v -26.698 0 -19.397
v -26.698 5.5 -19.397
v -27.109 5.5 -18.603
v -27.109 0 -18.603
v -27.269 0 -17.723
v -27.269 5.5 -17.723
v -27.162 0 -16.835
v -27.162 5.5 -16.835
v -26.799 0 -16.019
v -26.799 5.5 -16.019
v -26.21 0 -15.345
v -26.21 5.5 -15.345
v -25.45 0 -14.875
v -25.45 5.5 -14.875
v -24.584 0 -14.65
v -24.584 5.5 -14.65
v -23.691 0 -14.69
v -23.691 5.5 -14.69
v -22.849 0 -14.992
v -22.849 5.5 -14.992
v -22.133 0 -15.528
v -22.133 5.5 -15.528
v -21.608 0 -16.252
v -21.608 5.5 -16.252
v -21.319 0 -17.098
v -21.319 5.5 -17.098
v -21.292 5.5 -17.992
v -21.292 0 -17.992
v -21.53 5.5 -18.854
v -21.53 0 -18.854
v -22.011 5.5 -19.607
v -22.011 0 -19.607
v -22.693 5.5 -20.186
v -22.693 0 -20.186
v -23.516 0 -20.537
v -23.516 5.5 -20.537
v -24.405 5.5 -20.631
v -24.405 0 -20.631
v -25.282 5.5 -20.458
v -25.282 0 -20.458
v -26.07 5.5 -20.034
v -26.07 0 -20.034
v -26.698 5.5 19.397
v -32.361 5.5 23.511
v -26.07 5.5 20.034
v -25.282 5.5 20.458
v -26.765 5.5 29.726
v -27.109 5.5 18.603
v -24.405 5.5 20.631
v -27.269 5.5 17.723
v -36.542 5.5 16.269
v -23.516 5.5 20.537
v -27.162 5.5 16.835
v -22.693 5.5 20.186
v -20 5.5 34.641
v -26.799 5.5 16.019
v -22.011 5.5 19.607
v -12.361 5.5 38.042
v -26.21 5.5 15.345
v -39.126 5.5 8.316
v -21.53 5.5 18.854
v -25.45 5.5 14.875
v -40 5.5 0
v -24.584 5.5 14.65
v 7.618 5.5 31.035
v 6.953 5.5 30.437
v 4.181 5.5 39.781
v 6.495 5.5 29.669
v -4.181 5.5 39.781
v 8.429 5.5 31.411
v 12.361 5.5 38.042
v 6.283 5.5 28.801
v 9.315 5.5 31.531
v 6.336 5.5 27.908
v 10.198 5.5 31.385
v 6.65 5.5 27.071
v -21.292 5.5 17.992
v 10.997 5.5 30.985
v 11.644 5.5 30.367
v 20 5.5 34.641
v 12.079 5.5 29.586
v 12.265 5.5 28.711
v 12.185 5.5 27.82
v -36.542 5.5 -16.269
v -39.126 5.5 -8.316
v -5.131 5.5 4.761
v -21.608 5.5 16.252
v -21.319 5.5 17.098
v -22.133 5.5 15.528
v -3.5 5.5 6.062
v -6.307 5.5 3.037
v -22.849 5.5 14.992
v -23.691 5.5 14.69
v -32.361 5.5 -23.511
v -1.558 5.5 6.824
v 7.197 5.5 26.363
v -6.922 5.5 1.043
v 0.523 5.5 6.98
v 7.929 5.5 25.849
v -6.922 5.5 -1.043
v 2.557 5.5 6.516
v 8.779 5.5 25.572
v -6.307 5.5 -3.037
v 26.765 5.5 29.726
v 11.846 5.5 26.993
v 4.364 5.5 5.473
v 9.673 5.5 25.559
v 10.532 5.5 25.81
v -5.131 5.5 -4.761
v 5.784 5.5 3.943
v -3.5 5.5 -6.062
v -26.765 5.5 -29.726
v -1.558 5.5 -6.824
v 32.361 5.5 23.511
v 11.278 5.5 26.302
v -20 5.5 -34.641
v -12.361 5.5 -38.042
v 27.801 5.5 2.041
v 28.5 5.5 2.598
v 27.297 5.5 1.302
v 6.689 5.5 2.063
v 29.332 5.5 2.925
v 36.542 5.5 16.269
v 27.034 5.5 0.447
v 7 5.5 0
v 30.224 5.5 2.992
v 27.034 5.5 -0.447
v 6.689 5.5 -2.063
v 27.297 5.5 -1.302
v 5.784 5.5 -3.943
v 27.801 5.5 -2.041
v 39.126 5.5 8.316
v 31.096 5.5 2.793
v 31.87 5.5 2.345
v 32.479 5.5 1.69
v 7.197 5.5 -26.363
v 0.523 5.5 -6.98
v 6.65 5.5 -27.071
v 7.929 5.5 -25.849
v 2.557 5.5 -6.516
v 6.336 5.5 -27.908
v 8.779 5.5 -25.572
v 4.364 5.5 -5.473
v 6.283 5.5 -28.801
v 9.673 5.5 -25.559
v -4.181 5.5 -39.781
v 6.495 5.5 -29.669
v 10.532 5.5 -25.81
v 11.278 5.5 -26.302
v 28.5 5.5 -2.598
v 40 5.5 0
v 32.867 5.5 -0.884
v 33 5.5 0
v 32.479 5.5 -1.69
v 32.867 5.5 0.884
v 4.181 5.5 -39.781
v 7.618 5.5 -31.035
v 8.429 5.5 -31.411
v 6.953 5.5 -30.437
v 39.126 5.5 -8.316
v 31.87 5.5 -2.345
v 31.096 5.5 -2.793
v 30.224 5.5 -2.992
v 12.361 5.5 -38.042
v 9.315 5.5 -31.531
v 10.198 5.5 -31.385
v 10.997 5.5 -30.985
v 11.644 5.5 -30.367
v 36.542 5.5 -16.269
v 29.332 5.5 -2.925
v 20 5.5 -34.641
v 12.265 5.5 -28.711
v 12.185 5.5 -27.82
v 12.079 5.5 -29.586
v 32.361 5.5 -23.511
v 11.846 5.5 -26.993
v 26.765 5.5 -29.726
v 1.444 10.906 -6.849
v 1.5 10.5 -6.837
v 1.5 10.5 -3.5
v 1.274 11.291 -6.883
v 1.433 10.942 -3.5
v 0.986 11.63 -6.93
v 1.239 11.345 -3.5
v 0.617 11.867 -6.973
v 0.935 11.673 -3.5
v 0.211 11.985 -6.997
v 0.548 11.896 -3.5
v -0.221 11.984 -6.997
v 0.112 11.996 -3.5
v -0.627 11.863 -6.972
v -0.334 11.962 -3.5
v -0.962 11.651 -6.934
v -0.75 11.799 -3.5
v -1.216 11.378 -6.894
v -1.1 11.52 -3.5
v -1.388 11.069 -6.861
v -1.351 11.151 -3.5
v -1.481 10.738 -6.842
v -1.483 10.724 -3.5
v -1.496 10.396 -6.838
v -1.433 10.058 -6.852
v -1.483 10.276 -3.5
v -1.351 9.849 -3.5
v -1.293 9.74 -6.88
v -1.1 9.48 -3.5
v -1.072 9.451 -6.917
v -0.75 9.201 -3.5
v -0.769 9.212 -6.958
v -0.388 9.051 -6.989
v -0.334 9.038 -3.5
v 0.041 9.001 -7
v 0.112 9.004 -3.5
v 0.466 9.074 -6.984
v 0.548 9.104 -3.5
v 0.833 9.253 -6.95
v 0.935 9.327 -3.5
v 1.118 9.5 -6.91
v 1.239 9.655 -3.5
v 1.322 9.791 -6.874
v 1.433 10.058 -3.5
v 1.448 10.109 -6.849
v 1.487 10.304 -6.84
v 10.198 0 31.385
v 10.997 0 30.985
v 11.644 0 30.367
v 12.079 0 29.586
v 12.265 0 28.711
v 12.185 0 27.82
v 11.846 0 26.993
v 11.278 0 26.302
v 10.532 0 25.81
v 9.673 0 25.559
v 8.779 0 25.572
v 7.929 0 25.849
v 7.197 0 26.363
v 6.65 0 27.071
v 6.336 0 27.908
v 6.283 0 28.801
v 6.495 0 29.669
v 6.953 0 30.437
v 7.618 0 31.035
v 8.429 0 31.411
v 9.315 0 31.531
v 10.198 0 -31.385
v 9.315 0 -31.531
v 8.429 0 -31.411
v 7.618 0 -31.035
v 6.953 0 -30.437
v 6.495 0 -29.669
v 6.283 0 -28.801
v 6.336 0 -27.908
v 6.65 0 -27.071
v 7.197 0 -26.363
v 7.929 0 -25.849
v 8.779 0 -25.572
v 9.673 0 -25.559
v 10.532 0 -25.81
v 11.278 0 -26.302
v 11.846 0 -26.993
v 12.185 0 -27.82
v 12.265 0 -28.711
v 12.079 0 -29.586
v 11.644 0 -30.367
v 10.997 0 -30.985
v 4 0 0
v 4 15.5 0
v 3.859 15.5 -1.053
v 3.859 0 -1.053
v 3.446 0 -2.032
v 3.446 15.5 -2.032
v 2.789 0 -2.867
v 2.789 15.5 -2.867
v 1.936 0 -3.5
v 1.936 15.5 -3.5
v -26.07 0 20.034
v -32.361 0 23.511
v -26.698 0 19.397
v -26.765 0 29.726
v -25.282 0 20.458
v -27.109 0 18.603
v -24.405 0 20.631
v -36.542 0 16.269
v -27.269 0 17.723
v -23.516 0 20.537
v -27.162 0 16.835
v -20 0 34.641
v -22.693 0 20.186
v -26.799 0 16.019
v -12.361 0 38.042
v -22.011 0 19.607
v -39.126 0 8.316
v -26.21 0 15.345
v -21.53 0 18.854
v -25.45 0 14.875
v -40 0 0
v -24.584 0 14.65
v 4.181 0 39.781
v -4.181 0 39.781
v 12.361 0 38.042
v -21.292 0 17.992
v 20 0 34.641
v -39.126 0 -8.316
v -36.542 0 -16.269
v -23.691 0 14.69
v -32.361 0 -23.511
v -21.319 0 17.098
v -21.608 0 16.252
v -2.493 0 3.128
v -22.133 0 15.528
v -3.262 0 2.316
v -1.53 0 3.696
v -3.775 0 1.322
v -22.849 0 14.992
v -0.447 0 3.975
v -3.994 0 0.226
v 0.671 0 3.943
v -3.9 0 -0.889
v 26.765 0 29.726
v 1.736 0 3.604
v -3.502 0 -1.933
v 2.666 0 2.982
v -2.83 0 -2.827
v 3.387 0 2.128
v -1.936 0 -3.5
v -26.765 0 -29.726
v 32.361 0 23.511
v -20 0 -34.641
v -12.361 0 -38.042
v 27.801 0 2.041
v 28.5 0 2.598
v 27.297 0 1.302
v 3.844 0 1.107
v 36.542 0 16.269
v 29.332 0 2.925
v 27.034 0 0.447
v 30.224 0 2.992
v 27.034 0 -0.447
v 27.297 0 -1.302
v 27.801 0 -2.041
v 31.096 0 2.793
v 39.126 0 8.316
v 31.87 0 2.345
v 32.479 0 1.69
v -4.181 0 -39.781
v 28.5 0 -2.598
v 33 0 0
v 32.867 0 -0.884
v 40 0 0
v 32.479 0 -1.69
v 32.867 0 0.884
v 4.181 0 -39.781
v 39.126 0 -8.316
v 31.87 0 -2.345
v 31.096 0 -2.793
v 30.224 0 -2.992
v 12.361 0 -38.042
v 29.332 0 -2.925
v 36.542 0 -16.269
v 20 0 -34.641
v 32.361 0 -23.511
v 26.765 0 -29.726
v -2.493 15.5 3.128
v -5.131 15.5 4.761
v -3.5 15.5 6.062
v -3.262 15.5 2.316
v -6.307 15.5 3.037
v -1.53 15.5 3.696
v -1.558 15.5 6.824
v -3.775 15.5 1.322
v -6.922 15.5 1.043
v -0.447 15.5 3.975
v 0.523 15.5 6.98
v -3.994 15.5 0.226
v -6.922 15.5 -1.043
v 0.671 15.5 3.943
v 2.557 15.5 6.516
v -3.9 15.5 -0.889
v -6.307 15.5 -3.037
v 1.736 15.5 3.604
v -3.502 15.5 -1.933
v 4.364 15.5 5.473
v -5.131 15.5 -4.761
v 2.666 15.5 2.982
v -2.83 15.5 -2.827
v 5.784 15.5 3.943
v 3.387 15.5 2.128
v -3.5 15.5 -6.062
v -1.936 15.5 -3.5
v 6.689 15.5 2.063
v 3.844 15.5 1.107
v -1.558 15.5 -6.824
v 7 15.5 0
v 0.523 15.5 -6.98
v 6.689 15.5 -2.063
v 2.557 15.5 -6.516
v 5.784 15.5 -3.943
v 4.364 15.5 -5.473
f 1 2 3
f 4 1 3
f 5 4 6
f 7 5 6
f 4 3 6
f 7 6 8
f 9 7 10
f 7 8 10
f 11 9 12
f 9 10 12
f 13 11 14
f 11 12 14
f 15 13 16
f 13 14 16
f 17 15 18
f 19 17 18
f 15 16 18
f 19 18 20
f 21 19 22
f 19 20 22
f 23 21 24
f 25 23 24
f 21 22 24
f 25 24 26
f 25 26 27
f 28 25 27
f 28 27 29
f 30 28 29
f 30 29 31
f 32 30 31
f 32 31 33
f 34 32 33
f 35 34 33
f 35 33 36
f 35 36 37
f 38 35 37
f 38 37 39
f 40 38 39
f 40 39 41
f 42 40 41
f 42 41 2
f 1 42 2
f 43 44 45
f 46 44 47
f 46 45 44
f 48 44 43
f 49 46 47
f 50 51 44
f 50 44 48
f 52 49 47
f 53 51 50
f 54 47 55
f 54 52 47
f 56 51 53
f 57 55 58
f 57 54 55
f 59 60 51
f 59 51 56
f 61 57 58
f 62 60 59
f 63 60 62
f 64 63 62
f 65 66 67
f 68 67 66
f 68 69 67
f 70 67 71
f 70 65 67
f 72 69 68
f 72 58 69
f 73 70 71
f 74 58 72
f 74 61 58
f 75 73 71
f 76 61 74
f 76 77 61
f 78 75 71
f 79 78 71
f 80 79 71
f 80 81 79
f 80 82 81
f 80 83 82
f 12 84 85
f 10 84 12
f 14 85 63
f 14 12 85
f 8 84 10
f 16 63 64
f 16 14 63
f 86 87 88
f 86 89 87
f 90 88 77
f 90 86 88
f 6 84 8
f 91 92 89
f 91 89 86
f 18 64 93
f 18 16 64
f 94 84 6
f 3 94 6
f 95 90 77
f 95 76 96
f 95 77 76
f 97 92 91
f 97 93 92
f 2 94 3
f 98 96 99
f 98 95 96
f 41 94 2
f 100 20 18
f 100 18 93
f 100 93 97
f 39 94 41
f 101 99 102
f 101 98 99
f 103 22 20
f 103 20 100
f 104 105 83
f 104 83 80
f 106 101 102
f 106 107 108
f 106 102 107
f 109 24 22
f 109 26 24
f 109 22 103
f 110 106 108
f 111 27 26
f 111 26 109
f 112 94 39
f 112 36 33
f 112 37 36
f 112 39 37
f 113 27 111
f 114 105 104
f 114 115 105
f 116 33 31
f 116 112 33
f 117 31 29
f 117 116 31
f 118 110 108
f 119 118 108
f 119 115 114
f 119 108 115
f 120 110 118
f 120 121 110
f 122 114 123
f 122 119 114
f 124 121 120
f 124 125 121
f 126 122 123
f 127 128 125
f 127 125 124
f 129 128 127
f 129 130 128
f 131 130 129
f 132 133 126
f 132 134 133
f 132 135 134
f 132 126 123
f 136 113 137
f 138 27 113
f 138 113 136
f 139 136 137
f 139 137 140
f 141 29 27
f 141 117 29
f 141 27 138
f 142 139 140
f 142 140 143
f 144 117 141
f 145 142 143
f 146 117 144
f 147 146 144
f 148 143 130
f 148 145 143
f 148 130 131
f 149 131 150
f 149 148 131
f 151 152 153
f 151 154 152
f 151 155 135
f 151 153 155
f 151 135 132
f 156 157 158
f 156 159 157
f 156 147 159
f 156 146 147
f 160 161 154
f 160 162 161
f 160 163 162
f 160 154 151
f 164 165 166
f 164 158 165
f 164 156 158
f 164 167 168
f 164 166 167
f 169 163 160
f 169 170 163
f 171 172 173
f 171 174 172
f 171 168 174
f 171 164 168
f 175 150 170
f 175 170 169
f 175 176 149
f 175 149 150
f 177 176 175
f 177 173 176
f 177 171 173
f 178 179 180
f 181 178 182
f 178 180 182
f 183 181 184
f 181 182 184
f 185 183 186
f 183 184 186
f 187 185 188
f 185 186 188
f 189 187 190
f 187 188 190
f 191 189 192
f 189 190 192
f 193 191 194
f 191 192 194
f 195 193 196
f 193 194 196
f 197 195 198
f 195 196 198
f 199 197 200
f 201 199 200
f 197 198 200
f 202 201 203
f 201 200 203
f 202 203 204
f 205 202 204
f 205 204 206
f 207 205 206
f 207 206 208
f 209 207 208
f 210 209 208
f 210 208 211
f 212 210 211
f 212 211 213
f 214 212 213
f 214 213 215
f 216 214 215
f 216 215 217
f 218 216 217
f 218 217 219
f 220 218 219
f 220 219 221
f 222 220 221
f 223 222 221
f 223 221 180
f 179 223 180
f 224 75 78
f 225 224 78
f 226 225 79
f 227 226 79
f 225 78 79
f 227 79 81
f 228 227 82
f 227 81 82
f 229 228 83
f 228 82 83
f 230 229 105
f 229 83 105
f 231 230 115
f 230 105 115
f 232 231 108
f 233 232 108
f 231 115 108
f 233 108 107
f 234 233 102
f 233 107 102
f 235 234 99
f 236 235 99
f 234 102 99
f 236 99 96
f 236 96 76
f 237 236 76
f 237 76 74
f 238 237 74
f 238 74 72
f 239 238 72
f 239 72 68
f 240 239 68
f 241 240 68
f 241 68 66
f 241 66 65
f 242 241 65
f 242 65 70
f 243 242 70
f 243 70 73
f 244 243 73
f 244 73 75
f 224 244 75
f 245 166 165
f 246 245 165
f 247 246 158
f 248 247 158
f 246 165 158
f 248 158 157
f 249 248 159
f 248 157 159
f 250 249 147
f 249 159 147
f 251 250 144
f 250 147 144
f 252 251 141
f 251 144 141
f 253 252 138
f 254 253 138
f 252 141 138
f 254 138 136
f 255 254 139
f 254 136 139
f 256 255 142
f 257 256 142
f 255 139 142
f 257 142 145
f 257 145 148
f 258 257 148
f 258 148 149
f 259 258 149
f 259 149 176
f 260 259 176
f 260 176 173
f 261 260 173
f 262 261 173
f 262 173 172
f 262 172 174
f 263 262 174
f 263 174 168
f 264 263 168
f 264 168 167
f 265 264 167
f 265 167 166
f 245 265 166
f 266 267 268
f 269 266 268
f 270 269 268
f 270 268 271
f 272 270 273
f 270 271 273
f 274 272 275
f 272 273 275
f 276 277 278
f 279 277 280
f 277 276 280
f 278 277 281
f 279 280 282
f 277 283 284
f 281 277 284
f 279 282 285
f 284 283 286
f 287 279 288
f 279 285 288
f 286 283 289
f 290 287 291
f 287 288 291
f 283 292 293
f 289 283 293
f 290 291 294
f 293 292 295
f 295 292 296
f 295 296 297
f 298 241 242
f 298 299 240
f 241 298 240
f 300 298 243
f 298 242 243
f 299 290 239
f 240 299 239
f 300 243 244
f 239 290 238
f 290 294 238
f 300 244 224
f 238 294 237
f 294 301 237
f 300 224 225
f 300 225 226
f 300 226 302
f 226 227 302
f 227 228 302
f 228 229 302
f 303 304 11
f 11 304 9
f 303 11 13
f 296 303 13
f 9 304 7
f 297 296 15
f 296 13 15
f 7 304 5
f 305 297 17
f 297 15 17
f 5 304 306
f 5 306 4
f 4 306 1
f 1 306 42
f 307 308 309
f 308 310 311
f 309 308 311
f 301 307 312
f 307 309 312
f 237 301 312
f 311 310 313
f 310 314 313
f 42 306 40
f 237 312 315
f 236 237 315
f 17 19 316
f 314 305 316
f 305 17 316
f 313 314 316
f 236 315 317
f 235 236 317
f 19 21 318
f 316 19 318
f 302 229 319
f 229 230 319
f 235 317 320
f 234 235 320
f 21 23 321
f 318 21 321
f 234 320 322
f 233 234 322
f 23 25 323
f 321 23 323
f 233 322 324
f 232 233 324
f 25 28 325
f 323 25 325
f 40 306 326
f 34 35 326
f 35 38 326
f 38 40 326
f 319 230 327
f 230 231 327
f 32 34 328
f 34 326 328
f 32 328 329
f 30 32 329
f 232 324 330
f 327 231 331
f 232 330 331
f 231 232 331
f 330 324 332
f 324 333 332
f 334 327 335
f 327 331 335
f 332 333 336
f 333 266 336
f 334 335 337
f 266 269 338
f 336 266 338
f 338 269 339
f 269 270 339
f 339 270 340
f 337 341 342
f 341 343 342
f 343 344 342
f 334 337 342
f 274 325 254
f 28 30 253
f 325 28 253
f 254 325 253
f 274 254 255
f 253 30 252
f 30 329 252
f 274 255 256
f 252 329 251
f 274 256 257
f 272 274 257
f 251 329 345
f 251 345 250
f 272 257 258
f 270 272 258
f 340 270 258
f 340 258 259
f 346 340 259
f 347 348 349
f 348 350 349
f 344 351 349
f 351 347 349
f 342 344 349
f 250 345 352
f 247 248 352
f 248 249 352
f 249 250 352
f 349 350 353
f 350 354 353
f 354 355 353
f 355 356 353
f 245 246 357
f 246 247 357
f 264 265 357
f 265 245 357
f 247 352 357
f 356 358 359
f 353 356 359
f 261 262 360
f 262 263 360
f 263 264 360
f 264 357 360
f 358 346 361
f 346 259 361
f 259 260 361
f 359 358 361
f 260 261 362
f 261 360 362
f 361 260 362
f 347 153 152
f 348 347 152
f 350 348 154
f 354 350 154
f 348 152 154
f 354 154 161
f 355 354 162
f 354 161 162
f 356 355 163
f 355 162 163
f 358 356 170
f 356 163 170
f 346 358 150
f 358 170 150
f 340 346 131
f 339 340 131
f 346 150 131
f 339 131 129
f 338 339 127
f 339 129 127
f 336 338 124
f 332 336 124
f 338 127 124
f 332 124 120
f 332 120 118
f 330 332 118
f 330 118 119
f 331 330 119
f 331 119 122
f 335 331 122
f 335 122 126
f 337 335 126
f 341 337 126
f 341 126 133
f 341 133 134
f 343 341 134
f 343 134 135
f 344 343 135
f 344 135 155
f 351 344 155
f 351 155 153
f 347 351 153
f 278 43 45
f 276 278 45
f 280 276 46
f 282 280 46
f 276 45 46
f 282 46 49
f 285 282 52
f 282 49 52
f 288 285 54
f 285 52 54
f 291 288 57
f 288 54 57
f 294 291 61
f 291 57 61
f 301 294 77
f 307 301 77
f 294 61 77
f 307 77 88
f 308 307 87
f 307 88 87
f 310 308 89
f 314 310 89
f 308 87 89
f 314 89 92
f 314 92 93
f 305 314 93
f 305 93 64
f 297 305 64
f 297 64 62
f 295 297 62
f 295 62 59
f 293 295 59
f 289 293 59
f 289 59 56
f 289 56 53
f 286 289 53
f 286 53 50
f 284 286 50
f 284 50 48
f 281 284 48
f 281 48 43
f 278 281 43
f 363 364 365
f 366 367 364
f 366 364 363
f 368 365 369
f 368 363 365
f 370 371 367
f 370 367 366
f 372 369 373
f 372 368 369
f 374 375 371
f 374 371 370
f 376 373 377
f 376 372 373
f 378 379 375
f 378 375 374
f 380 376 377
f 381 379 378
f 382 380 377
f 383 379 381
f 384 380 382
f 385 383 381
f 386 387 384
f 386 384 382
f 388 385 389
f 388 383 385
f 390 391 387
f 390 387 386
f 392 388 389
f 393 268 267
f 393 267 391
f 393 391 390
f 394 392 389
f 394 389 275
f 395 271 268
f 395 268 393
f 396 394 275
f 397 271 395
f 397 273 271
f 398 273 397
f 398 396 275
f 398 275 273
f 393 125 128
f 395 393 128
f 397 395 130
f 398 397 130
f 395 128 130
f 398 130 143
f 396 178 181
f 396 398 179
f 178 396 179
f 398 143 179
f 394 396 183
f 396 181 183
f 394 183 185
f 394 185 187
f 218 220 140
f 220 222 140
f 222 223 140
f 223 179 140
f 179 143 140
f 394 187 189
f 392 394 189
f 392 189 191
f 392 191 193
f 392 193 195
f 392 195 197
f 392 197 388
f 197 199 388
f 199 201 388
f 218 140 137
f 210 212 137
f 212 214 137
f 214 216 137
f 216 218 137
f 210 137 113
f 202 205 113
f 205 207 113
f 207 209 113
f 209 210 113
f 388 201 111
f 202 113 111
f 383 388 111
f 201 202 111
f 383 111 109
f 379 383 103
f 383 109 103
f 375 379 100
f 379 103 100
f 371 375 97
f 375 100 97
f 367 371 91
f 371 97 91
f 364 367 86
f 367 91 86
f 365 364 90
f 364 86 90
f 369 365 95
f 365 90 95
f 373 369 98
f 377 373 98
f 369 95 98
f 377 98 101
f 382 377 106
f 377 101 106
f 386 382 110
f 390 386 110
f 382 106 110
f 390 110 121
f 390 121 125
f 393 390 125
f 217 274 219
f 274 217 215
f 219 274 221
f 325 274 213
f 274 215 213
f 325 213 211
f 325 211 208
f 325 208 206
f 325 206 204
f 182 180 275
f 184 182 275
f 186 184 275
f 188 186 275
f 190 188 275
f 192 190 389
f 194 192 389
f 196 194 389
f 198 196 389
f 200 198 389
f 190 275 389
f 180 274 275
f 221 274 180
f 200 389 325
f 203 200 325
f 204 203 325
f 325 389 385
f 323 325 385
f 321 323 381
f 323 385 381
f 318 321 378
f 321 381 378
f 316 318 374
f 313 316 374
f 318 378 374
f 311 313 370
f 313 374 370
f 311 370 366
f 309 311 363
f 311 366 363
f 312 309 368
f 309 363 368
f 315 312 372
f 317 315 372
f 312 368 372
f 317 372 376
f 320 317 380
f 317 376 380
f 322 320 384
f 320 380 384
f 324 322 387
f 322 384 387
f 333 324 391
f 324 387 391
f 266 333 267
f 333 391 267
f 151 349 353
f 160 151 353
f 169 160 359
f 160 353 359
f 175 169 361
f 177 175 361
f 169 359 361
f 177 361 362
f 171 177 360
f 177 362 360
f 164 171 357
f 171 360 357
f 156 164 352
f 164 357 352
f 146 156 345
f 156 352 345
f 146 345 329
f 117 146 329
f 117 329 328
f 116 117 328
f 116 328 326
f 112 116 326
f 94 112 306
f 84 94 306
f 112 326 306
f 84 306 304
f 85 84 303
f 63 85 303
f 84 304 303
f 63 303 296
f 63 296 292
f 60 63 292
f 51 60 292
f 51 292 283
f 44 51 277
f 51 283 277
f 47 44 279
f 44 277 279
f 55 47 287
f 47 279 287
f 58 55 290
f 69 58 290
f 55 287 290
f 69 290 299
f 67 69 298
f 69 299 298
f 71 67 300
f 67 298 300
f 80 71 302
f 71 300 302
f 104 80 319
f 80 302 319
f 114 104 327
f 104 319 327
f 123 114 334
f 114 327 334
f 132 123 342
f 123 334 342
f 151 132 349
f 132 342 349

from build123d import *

# Parameters (mm, degrees)
SKETCH1_R           = 40
BOSS_EXTRUDE1_DEPTH = 5.5
SKETCH2_R           = 3
CUT_EXTRUDE1_DEPTH  = 6.5
CIRPATTERN1_COUNT   = 5
SKETCH3_R           = 7
BOSS_EXTRUDE2_DEPTH = 10
CUT_EXTRUDE2_DEPTH  = 20
SKETCH8_R           = 1.5
CUT_EXTRUDE3_DEPTH  = 10


with BuildPart() as part:
    # Sketch1 → Boss-Extrude1 (new body)
    with BuildSketch(Plane(origin=(0, 0, 0), x_dir=(1, 0, 0), z_dir=(0, 1, 0))):
        Circle(SKETCH1_R)
    extrude(amount=BOSS_EXTRUDE1_DEPTH)

    # Sketch2 → Cut-Extrude1 (cut, through all)
    with BuildSketch(Plane(origin=(0, 5.5, 0), x_dir=(1, 0, 0), z_dir=(0, 1, 0))):
        with Locations((30, 0)):
            Circle(SKETCH2_R)
    cut_extrude1 = extrude(amount=-CUT_EXTRUDE1_DEPTH, mode=Mode.SUBTRACT)

    # CirPattern1: Cut-Extrude1 ×5 about axis
    cirpattern1_axis = Axis((0, 0, 0), (0, 1, 0))
    for i in range(1, CIRPATTERN1_COUNT):
        add(cut_extrude1.rotate(cirpattern1_axis, i * 360 / CIRPATTERN1_COUNT), mode=Mode.SUBTRACT)

    # Sketch3 → Boss-Extrude2 (add)
    with BuildSketch(Plane(origin=(0, 5.5, 0), x_dir=(1, 0, 0), z_dir=(0, 1, 0))):
        Circle(SKETCH3_R)
    extrude(amount=BOSS_EXTRUDE2_DEPTH)

    # Sketch7 → Cut-Extrude2 (cut)
    with BuildSketch(Plane(origin=(0, 15.5, 0), x_dir=(1, 0, 0), z_dir=(0, 1, 0))):
        with BuildLine():
            ThreePointArc((4, 0), (3.445719569, 2.031506006), (1.936491673, 3.5))
            Line((1.936491673, 3.5), (-1.936491673, 3.5))
            ThreePointArc((-1.936491673, 3.5), (-2.031506006, -3.445719569), (4, 0))
        make_face()
    extrude(amount=-CUT_EXTRUDE2_DEPTH, mode=Mode.SUBTRACT)

    # Sketch8 → Cut-Extrude3 (cut)
    with BuildSketch(Plane.XY):
        with Locations((0, 10.5)):
            Circle(SKETCH8_R)
    extrude(amount=-CUT_EXTRUDE3_DEPTH, mode=Mode.SUBTRACT)


solid = part.part
